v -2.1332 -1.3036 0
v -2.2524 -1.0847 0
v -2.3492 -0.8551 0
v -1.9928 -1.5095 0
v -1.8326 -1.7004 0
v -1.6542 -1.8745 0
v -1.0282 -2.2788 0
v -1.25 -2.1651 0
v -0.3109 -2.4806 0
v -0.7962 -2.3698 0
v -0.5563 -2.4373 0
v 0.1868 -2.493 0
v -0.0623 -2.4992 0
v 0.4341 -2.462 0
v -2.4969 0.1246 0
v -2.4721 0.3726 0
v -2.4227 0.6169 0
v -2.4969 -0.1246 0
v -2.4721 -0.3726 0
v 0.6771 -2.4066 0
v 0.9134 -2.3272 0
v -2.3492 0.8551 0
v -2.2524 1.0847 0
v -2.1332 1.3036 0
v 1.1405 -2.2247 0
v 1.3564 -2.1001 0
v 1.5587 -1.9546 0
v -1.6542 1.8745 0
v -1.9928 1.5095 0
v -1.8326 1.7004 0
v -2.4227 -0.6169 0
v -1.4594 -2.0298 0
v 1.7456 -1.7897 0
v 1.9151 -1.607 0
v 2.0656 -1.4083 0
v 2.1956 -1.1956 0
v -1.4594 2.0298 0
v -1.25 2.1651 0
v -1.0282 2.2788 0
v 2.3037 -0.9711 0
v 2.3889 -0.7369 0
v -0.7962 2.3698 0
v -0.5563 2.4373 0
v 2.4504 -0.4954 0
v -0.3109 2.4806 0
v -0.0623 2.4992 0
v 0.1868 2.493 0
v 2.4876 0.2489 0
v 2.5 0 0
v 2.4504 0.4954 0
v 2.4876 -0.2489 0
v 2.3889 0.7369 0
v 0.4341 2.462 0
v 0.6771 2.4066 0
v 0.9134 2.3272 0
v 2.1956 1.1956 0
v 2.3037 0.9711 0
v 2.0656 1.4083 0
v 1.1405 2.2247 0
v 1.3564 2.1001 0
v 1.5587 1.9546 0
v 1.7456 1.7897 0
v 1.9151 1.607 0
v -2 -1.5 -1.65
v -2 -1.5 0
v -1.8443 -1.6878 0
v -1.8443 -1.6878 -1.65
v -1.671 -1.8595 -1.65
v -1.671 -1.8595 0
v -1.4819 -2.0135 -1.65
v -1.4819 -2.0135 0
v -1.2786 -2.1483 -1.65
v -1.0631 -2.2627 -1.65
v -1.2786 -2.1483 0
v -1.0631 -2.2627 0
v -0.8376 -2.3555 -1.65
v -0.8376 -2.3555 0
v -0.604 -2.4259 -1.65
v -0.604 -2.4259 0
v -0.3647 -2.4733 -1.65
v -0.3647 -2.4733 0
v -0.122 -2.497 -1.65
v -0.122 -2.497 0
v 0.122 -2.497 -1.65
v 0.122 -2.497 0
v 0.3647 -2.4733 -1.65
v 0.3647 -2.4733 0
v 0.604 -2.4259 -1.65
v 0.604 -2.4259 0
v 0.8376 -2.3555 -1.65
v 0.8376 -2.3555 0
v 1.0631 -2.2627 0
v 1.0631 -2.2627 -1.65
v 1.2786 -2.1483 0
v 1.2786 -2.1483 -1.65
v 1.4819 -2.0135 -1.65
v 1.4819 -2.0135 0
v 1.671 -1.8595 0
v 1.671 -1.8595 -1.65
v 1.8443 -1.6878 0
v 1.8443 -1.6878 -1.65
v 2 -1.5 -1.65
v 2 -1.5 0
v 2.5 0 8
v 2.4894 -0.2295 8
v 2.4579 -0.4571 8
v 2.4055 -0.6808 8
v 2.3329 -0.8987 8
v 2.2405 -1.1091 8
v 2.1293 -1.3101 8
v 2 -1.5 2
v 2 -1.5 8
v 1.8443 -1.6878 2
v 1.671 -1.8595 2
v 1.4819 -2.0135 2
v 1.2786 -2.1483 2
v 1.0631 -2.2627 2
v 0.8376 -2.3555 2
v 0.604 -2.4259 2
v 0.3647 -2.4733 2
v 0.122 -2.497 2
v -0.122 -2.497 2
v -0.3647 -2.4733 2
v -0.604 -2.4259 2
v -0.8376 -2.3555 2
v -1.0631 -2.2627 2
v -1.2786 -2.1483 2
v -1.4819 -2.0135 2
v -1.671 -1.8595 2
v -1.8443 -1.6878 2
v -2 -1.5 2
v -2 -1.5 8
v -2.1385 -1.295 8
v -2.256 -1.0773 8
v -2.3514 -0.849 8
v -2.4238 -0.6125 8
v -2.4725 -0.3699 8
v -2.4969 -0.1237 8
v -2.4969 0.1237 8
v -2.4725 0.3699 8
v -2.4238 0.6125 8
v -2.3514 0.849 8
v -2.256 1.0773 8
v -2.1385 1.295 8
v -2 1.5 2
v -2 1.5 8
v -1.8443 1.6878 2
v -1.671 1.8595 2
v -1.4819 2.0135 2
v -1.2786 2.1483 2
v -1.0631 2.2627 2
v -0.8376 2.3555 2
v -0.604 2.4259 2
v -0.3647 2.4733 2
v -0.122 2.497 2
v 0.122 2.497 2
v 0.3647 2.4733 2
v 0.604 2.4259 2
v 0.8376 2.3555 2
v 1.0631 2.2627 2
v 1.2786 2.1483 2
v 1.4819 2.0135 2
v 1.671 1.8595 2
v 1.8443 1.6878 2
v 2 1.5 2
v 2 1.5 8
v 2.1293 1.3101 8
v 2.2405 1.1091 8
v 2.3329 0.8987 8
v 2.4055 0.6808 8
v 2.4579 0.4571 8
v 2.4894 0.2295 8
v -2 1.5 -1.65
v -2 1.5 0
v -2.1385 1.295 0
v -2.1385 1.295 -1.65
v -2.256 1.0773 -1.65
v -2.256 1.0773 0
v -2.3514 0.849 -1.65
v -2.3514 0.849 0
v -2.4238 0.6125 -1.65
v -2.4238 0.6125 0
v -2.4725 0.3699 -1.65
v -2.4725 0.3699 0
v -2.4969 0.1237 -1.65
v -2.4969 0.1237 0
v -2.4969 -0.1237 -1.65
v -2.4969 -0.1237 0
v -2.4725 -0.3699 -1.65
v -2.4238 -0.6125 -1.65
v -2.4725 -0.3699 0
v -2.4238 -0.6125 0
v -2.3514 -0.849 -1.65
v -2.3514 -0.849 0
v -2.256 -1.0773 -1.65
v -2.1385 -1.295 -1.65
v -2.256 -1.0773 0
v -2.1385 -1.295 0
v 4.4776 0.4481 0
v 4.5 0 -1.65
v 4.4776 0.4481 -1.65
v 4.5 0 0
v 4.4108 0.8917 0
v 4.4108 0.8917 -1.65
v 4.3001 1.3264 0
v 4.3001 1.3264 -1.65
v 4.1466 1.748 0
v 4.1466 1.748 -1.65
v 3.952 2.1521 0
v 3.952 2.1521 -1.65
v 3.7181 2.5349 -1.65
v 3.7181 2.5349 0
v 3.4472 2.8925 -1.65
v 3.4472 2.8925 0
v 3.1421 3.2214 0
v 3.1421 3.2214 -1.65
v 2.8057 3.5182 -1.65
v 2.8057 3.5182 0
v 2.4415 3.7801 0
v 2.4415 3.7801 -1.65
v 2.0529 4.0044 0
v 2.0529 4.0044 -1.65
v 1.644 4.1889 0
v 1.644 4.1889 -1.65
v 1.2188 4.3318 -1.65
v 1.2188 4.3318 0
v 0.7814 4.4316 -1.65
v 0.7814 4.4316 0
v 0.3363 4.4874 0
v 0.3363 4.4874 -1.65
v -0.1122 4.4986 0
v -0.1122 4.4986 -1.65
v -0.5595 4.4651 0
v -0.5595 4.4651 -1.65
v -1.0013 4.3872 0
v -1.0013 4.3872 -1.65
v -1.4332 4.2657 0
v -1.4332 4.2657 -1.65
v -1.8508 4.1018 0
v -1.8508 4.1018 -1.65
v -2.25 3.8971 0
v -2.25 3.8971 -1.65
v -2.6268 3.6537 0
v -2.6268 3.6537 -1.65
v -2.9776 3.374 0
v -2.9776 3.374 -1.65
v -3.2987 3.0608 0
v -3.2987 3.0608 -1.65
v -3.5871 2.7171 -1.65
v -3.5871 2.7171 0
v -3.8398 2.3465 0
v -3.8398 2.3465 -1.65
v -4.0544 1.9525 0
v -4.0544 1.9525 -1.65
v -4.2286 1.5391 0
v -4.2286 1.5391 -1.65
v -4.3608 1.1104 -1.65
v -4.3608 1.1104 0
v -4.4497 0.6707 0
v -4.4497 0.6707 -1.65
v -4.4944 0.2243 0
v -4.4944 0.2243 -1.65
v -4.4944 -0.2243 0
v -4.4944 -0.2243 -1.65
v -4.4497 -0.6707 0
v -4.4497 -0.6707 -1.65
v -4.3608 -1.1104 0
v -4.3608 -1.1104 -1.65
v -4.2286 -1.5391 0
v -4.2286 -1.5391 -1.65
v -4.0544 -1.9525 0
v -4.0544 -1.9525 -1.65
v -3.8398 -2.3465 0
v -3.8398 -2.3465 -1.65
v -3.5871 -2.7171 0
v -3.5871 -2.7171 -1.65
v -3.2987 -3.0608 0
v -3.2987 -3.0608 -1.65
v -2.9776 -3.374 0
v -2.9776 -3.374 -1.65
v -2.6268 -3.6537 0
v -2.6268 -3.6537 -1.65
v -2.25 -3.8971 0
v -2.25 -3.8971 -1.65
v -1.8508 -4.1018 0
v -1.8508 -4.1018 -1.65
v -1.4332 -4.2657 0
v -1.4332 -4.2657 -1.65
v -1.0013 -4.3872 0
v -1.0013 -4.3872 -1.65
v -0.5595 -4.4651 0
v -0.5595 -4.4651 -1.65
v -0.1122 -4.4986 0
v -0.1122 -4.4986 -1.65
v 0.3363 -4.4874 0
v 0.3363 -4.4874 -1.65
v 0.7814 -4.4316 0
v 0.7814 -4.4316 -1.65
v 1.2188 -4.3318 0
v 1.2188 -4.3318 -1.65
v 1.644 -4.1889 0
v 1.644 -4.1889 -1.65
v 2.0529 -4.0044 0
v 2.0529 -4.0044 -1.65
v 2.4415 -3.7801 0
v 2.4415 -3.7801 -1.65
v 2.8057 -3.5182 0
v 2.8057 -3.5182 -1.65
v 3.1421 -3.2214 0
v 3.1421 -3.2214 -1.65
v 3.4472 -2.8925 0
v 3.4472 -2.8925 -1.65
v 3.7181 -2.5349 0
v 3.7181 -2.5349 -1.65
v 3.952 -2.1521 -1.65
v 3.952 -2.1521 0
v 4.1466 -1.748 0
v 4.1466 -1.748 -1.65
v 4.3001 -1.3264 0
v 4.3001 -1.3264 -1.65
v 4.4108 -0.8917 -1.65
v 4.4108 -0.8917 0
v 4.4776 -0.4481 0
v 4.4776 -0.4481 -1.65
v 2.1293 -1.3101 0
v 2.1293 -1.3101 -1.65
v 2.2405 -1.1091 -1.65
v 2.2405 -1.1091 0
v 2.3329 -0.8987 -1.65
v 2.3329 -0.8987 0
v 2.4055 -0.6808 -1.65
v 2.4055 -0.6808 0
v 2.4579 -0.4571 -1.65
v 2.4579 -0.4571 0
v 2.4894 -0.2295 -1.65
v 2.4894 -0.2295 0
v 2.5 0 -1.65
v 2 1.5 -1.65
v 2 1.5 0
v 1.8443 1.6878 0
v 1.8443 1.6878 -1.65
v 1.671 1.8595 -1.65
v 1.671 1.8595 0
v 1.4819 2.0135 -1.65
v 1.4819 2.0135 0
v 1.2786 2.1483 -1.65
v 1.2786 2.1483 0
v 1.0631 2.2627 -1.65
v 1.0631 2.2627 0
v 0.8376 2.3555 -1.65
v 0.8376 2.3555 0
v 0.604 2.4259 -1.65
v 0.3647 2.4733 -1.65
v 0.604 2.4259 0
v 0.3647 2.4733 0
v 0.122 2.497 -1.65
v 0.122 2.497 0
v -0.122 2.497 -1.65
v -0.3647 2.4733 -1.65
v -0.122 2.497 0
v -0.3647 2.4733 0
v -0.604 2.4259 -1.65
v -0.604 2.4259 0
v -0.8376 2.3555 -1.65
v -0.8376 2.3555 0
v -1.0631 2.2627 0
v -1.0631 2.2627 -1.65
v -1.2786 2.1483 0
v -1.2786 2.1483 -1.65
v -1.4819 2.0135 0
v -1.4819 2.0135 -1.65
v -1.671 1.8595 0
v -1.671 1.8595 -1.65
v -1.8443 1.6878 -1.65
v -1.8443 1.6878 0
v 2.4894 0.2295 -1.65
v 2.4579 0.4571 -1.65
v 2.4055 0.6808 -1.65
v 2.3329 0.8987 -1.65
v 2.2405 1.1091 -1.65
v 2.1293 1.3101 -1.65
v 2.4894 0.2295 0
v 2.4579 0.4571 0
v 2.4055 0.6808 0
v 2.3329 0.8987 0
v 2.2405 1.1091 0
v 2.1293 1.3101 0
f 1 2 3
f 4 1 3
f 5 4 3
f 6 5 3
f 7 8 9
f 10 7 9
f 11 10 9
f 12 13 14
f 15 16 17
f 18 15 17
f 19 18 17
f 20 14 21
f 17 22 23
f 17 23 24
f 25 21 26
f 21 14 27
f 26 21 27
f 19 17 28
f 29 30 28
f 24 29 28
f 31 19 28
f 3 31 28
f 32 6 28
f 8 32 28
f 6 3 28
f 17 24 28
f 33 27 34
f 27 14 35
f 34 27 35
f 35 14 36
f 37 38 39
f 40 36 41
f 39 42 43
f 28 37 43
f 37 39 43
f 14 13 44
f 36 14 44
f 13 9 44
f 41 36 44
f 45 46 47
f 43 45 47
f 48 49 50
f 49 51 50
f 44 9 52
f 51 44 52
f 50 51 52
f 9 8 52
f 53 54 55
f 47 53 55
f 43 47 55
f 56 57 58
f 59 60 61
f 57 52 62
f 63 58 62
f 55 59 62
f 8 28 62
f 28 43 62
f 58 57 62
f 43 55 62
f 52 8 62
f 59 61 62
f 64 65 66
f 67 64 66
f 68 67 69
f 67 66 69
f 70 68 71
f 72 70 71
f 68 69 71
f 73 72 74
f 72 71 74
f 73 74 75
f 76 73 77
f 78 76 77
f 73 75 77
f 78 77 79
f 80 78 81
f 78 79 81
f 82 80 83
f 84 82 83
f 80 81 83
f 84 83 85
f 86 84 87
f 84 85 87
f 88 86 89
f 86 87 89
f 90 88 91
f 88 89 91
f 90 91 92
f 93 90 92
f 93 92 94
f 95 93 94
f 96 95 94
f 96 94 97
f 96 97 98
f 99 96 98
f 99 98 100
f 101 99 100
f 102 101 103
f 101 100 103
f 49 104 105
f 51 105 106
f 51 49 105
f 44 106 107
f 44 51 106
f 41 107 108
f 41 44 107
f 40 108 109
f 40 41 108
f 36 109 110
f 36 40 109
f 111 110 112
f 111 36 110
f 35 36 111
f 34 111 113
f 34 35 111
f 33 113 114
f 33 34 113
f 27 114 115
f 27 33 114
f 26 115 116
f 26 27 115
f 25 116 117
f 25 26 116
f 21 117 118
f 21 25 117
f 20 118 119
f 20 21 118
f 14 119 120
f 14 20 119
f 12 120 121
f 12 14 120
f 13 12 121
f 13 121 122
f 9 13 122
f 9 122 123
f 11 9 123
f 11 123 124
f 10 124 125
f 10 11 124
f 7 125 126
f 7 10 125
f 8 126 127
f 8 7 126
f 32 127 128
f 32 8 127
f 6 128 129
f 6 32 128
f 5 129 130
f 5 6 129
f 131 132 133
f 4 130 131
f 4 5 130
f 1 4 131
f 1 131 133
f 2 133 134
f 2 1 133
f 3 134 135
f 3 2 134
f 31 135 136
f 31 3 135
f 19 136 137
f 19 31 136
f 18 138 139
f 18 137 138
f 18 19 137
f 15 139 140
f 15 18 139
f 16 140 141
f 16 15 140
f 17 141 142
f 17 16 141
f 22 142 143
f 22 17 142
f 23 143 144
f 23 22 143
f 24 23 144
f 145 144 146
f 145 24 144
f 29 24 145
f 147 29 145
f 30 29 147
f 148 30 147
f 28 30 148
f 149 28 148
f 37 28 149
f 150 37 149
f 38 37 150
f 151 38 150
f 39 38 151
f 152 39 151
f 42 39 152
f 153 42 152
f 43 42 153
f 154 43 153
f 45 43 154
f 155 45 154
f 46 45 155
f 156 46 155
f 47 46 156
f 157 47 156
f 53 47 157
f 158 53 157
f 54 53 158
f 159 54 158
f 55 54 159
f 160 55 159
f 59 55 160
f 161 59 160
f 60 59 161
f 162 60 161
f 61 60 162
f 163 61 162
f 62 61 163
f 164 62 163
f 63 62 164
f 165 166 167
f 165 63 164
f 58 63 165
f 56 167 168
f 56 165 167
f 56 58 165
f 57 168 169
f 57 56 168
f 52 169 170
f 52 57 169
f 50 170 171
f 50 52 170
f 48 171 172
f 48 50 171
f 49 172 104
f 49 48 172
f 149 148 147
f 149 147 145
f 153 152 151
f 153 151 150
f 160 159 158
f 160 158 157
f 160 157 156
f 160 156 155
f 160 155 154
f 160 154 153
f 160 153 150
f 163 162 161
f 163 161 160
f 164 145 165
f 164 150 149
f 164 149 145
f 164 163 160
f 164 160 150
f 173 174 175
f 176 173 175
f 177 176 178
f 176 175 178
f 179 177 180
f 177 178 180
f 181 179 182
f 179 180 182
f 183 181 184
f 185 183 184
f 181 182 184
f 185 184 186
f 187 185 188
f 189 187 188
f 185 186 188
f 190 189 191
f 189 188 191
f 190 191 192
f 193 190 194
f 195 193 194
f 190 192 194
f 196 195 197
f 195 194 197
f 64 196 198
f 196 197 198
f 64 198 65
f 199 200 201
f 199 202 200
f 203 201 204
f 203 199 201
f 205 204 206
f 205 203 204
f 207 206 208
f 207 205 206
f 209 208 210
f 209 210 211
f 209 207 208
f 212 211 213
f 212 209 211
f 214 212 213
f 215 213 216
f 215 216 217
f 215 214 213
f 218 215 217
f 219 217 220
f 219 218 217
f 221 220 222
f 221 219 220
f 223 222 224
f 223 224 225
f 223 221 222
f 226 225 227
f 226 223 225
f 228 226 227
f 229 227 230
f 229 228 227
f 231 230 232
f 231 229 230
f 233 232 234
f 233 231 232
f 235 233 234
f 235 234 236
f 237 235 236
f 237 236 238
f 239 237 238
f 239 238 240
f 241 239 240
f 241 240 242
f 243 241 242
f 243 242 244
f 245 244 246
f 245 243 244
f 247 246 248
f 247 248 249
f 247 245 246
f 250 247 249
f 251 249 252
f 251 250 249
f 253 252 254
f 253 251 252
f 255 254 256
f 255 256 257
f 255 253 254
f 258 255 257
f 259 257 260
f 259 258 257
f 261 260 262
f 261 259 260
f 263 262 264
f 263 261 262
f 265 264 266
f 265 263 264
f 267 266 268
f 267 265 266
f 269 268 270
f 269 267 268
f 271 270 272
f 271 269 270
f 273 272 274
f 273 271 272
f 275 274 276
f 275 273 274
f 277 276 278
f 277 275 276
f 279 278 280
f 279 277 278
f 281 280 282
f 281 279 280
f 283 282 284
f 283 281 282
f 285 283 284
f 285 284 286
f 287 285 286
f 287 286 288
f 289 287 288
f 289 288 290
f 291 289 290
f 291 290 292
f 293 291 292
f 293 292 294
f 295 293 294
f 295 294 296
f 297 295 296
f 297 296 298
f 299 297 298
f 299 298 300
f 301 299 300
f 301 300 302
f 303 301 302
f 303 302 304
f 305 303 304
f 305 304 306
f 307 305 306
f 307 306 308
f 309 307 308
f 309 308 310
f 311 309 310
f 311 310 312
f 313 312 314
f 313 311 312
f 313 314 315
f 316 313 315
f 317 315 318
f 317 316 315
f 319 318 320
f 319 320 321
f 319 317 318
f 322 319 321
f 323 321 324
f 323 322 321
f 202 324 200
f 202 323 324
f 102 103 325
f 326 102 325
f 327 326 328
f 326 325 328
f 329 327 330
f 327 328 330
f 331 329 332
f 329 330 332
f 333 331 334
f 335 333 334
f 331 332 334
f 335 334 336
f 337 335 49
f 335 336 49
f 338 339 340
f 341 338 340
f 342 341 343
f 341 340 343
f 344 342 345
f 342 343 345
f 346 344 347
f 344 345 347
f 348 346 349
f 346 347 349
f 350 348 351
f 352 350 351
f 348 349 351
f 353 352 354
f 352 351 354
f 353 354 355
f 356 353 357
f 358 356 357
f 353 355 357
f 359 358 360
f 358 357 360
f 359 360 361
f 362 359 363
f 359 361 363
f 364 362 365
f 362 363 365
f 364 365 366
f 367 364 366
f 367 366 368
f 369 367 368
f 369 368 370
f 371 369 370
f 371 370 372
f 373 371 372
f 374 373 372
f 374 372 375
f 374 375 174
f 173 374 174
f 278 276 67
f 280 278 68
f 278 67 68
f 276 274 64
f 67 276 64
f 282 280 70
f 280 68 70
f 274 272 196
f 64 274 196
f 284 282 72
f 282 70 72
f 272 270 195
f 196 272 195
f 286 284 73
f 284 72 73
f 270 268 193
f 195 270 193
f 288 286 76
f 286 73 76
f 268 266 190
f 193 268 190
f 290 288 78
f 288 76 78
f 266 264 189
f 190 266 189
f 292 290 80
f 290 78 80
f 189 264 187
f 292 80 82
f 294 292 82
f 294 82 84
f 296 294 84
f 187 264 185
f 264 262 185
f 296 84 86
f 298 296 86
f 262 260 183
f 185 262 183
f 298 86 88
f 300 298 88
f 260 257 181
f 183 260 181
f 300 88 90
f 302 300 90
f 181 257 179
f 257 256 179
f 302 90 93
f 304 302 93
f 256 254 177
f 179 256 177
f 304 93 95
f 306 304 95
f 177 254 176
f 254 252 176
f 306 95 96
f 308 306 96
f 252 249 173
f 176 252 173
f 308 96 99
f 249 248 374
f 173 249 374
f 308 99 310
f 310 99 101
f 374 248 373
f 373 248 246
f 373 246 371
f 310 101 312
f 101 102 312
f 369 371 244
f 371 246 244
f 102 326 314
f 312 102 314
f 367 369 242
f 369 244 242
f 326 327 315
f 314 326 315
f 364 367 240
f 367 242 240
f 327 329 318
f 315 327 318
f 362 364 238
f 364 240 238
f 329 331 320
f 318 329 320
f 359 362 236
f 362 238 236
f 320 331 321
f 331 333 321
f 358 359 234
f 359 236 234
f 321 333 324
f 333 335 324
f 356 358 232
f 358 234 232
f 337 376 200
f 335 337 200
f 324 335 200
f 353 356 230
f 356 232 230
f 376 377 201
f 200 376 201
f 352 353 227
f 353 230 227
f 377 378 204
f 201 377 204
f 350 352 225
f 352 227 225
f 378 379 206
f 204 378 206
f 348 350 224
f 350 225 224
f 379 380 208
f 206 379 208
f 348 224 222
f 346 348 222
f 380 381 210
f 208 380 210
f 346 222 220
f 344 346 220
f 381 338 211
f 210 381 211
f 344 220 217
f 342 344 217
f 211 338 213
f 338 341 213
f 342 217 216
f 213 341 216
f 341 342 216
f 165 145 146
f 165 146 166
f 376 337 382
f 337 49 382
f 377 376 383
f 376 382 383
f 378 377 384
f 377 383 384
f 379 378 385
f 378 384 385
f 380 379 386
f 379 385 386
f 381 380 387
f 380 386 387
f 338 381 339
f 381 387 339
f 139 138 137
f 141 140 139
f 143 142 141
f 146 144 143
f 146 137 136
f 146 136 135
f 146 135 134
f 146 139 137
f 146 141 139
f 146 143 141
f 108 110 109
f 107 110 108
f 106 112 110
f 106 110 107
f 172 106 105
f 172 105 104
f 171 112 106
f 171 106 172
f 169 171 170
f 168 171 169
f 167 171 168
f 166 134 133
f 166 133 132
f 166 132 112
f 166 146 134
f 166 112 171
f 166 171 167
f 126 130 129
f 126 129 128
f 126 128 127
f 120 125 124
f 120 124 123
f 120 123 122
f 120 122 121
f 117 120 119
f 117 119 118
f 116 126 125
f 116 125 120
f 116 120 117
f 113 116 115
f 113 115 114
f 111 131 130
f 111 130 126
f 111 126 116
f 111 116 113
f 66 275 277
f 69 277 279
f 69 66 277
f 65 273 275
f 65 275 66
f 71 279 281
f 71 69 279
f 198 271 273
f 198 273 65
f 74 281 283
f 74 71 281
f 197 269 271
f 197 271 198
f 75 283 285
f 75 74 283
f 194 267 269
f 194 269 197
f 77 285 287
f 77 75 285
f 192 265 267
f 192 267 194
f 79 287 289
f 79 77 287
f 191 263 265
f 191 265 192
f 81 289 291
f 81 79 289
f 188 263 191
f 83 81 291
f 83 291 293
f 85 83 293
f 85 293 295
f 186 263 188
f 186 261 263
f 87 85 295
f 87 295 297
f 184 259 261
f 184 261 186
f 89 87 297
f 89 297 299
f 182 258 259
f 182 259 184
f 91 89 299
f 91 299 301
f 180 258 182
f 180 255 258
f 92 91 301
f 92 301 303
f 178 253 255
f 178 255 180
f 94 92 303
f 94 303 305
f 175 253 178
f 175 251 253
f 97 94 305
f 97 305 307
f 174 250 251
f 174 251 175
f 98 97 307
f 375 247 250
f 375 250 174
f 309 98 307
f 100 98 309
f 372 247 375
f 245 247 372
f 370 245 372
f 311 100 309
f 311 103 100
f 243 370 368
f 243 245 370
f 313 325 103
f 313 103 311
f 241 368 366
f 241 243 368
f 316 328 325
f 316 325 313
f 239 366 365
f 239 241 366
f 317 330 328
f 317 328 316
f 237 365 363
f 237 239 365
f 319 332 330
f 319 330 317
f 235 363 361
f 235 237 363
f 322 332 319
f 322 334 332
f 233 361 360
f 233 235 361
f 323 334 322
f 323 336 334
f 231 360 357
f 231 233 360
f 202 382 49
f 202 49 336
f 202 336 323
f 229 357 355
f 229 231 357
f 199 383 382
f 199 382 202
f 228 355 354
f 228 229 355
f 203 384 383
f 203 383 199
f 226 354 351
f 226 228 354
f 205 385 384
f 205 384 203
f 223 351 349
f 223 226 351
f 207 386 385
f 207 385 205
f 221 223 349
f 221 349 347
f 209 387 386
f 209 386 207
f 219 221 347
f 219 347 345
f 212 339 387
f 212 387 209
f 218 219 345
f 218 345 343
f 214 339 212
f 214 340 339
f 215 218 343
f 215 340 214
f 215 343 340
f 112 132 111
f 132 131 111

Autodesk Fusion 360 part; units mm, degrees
sketch "Boceto1" plane through (0, 0, 0) normal (0, 0, 1) x (1, 0, 0)
  circle A0 centre (0, 0) radius 2.5
  line L0 (-2, 1.5) -> (2, 1.5)
  circle A1 centre (0, 0) radius 4.5
  line L1 (-2, -1.5) -> (2, -1.5)
  dimension "d1" = 5
  dimension "d2" = 1.5
  dimension "d3" = 9
  dimension "d10" = 3
extrude "Extruir1" add sketch "Boceto1" along normal blind 8 contours A0 L0 L1 makes body 1
extrude "Extruir2" add sketch "Boceto1" along normal blind 2 contours A0 L0 | A0 L1 bodies 1
extrude "Extruir3" add sketch "Boceto1" against normal blind 1.65 separate body makes body 2
equation "d2 = d10 / 2"
